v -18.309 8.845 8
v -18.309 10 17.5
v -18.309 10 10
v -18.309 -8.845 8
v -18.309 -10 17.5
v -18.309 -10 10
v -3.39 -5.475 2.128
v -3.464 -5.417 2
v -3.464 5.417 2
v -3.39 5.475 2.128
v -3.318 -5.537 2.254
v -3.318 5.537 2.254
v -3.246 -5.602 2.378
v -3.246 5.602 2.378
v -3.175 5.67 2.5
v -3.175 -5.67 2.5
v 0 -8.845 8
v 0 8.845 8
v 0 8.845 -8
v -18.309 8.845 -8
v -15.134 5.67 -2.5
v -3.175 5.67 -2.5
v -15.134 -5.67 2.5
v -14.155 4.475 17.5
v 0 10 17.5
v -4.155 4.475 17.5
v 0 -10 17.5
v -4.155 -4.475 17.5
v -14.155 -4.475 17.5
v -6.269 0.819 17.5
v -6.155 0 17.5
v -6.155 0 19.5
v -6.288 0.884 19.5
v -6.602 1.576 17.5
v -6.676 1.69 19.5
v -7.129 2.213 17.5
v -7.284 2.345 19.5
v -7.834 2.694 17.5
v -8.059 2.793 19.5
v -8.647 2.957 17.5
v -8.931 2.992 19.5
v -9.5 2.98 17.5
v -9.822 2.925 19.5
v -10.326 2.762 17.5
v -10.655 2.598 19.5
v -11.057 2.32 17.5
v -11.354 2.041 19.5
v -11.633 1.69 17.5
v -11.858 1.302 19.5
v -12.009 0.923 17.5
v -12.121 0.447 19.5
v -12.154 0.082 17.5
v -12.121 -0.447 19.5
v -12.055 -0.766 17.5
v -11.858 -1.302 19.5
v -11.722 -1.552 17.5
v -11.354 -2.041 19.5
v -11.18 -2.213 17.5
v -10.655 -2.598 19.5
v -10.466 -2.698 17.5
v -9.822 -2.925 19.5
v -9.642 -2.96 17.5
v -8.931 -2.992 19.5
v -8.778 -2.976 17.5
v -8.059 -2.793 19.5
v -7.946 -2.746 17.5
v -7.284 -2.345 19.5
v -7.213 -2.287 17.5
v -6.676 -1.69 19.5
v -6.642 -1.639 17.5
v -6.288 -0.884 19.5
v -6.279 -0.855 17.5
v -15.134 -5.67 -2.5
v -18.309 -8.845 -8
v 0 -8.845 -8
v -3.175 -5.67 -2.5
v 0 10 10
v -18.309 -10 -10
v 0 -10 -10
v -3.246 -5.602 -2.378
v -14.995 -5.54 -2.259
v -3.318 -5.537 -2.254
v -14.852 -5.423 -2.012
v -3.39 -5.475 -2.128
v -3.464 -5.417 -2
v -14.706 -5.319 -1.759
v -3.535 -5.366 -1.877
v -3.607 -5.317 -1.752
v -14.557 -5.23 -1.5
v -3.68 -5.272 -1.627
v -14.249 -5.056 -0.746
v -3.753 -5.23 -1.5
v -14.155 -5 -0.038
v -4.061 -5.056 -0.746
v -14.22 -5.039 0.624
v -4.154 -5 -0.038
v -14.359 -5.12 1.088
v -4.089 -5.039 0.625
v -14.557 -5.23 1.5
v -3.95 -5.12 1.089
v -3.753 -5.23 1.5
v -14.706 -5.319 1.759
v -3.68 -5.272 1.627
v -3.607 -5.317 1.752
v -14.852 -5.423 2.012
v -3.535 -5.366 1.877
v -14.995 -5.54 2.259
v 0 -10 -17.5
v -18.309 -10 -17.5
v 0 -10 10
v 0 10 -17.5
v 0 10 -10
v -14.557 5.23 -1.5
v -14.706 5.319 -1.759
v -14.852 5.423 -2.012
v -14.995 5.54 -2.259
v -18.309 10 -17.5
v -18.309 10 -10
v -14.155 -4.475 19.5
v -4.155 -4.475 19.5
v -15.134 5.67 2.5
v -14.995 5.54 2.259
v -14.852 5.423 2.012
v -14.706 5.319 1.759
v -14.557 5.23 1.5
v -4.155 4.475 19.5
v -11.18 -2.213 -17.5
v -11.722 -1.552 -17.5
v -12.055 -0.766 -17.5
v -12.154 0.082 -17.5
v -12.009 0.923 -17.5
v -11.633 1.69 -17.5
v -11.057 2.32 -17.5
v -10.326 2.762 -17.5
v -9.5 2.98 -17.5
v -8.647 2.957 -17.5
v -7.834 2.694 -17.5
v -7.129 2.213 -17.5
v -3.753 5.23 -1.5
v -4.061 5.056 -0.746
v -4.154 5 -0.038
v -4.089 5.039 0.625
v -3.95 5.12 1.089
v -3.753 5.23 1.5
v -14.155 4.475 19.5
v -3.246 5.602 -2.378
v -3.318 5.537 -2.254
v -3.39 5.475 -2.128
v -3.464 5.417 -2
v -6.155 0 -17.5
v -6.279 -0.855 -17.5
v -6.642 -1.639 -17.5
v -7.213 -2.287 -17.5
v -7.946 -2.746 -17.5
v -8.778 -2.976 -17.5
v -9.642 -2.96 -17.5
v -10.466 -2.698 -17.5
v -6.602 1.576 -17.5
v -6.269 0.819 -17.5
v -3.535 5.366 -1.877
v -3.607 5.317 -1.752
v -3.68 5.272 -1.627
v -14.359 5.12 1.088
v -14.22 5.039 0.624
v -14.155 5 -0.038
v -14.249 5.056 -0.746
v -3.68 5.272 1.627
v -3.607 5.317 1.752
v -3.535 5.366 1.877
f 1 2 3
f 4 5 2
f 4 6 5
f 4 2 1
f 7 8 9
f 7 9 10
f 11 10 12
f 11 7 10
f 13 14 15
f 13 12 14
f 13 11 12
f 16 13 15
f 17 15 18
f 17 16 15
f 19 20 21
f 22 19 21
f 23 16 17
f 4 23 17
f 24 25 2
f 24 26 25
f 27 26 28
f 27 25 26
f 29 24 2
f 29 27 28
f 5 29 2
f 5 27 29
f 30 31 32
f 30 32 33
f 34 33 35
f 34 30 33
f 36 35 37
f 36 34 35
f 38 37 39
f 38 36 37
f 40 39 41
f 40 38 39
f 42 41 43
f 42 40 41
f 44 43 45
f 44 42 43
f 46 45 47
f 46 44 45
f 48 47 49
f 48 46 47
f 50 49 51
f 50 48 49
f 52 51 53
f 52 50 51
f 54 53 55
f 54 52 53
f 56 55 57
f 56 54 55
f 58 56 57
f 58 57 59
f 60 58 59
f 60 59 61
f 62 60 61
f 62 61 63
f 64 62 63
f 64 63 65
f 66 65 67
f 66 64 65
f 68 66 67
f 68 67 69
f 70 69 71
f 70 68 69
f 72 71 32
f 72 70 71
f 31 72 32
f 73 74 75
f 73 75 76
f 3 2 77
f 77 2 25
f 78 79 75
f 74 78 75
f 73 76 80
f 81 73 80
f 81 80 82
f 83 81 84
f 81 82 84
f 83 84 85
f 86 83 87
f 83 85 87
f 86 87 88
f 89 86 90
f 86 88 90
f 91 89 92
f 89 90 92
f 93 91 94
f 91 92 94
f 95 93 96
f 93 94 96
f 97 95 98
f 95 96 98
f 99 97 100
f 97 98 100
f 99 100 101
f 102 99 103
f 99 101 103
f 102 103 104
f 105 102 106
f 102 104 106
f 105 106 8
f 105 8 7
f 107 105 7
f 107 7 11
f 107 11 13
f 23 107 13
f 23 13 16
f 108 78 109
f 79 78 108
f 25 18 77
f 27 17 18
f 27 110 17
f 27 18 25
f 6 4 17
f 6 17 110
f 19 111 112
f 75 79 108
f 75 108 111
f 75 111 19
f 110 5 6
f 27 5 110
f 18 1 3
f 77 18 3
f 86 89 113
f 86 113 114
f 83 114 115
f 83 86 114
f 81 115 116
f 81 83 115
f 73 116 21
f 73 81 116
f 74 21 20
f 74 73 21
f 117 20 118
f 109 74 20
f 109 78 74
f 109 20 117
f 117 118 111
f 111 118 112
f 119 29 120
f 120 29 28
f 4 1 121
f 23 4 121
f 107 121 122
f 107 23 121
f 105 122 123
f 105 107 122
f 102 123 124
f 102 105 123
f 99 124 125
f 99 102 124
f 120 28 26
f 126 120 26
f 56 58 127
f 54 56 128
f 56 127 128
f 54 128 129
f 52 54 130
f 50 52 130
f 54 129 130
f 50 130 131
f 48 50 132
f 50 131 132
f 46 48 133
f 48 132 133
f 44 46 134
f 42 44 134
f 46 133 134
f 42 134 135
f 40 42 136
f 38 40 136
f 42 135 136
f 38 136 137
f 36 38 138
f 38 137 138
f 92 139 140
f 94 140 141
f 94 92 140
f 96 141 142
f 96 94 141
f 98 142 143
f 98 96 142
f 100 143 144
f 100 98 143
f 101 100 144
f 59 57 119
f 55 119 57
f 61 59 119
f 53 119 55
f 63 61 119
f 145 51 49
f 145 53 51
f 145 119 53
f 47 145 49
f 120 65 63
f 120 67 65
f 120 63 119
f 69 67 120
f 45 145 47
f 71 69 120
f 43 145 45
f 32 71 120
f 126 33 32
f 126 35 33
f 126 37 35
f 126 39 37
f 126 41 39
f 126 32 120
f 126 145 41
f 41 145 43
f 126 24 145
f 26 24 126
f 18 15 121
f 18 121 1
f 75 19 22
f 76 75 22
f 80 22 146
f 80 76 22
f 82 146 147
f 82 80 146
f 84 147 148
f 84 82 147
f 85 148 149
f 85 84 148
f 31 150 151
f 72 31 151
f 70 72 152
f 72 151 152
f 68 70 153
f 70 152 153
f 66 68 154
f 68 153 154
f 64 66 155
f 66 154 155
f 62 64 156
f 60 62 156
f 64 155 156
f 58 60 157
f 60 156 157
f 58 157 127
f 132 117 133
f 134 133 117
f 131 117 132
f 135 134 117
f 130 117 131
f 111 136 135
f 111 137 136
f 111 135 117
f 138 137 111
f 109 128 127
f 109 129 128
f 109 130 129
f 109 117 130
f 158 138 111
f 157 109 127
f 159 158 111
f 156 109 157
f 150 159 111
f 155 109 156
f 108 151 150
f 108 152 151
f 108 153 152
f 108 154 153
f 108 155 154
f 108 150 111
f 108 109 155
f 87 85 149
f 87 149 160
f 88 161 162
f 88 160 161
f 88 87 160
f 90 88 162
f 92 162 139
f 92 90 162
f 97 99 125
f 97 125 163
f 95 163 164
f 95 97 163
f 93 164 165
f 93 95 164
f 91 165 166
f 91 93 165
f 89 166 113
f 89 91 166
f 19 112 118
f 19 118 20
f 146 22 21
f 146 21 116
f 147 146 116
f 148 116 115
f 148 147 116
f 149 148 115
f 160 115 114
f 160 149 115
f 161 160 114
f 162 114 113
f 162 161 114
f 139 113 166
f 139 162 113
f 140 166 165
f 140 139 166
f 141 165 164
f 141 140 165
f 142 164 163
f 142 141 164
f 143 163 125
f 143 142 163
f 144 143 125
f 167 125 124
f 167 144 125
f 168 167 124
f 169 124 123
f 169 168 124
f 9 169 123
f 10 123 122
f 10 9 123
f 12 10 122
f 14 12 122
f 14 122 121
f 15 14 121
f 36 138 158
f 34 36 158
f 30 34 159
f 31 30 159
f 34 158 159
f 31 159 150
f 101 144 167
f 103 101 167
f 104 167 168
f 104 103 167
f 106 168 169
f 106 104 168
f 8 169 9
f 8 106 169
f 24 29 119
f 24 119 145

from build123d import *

# Parameters (mm, degrees)
F1_DEPTH = 10
F3_DEPTH = 18.3104010768
F5_DEPTH = 35.001
F6_W     = 10
F6_H     = 8.9491856137
F6_R     = 3
F7_DEPTH = 2


# Not quite as in the source:
# - a pattern or mirror of a feature is missing from the dataset's text; its kind, count and spacing are read off the source's solid


with BuildPart() as f1:
    # F0 (on Front) → F1 (new body, symmetric)
    with BuildSketch(Plane.XZ):
        with BuildLine():
            Line((-3.7527767497, 1.5), (-3.4641016043, 2.0000000188))
            Line((-3.4641016043, 2.0000000188), (0, 8))
            Line((0, 8), (0, 17.5))
            Line((0, 17.5), (-18.3094010768, 17.5))
            Line((-18.3094010768, 17.5), (-18.3094010768, 8))
            Line((-18.3094010768, 8), (-14.556624327, 1.5))
            ThreePointArc((-14.556624327, 1.5), (-14.1547005384, 0), (-14.556624327, -1.5))
            Line((-14.556624327, -1.5), (-18.3094010768, -8))
            Line((-18.3094010768, -8), (-18.3094010768, -17.5))
            Line((-18.3094010768, -17.5), (0, -17.5))
            Line((0, -17.5), (0, -8))
            Line((0, -8), (-3.4641016187, -1.9999999939))
            Line((-3.4641016187, -1.9999999939), (-3.7527767497, -1.5))
            ThreePointArc((-3.7527767497, -1.5), (-4.1547005384, 0), (-3.7527767497, 1.5))
        make_face()
    extrude(amount=F1_DEPTH, both=True)

    # F2 (on Right) → F3 (cut, through all)
    with BuildSketch(Plane.YZ):
        with BuildLine():
            ThreePointArc((-6.7017059222, 0), (-7.2468927023, 4.1411047244), (-8.8452994645, 8.0000000049))
            Line((-8.8452994645, 8), (-10, 8))
            Line((-10, 8), (-10, 1.5))
            Line((-10, 1.5), (-10, -8))
            Line((-10, -8), (-10, -9.7296796796))
            ThreePointArc((-10, -9.7296796796), (-9.3945168749, -8.8836208643), (-8.8452995254, -8.0000001104))
            ThreePointArc((-8.8452995254, -8.0000001104), (-7.246892718, -4.1411047832), (-6.7017059222, 0))
        make_face()
        with BuildLine():
            ThreePointArc((-8.8452994645, 8.0000000049), (-9.3945168411, 8.8836208136), (-10, 9.7296796796))
            Line((-10, 9.7296796796), (-10, 8))
            Line((-10, 8), (-8.8452994645, 8))
        make_face()
        with BuildLine():
            Line((-5.6698729811, 2.5), (-8.8452994645, 8.0000000049))
            ThreePointArc((-8.8452994645, 8.0000000049), (-7.2468927023, 4.1411047244), (-6.7017059222, 0))
            ThreePointArc((-6.7017059222, 0), (-7.246892718, -4.1411047832), (-8.8452995254, -8.0000001104))
            Line((-8.8452995254, -8.0000001104), (-5.6698729811, -2.5))
            ThreePointArc((-5.6698729811, -2.5), (-5, 0), (-5.6698729811, 2.5))
        make_face()
        with BuildLine():
            Line((-8.8452994645, 8.0000000049), (-10, 10))
            Line((-10, 10), (-10, 9.7296796796))
            ThreePointArc((-10, 9.7296796796), (-9.3945168411, 8.8836208136), (-8.8452994645, 8.0000000049))
        make_face()
        with BuildLine():
            ThreePointArc((-8.8452995254, -8.0000001104), (-9.3945168749, -8.8836208643), (-10, -9.7296796796))
            Line((-10, -9.7296796796), (-10, -10))
            Line((-10, -10), (-8.8452995254, -8.0000001104))
        make_face()
    f3 = extrude(amount=-F3_DEPTH, mode=Mode.SUBTRACT)

    # F3_copies: F3 across plane
    add(f3.mirror(Plane.ZX), mode=Mode.SUBTRACT)

    # F4 (on face) → F5 (cut, through all)
    with BuildSketch(Plane(origin=(0, 0, -17.5), x_dir=(1, 0, 0), z_dir=(0, 0, -1))):
        with BuildLine():
            Line((-11.1804351675, 2.2127808776), (-7.1289659092, -2.2127808776))
            ThreePointArc((-7.1289659092, -2.2127808776), (-6.4090490777, -1.2088829787), (-6.1547005384, 0))
            ThreePointArc((-6.1547005384, 0), (-7.9458175596, 2.7456514607), (-11.1804351675, 2.2127808776))
        make_face()
        with BuildLine():
            ThreePointArc((-11.1804351675, 2.2127808776), (-11.367481416, -2.0257346291), (-7.1289659092, -2.2127808776))
            Line((-7.1289659092, -2.2127808776), (-11.1804351675, 2.2127808776))
        make_face()
    extrude(amount=-F5_DEPTH, mode=Mode.SUBTRACT)

    # F6 (on face) → F7 (join)
    with BuildSketch(Plane.XY.offset(17.5)):
        with Locations((-9.1547005384, 0)):
            Rectangle(F6_W, F6_H)
        with Locations((-9.1547005384, 0)):
            Circle(F6_R, mode=Mode.SUBTRACT)
    extrude(amount=F7_DEPTH)


solid = f1.part
